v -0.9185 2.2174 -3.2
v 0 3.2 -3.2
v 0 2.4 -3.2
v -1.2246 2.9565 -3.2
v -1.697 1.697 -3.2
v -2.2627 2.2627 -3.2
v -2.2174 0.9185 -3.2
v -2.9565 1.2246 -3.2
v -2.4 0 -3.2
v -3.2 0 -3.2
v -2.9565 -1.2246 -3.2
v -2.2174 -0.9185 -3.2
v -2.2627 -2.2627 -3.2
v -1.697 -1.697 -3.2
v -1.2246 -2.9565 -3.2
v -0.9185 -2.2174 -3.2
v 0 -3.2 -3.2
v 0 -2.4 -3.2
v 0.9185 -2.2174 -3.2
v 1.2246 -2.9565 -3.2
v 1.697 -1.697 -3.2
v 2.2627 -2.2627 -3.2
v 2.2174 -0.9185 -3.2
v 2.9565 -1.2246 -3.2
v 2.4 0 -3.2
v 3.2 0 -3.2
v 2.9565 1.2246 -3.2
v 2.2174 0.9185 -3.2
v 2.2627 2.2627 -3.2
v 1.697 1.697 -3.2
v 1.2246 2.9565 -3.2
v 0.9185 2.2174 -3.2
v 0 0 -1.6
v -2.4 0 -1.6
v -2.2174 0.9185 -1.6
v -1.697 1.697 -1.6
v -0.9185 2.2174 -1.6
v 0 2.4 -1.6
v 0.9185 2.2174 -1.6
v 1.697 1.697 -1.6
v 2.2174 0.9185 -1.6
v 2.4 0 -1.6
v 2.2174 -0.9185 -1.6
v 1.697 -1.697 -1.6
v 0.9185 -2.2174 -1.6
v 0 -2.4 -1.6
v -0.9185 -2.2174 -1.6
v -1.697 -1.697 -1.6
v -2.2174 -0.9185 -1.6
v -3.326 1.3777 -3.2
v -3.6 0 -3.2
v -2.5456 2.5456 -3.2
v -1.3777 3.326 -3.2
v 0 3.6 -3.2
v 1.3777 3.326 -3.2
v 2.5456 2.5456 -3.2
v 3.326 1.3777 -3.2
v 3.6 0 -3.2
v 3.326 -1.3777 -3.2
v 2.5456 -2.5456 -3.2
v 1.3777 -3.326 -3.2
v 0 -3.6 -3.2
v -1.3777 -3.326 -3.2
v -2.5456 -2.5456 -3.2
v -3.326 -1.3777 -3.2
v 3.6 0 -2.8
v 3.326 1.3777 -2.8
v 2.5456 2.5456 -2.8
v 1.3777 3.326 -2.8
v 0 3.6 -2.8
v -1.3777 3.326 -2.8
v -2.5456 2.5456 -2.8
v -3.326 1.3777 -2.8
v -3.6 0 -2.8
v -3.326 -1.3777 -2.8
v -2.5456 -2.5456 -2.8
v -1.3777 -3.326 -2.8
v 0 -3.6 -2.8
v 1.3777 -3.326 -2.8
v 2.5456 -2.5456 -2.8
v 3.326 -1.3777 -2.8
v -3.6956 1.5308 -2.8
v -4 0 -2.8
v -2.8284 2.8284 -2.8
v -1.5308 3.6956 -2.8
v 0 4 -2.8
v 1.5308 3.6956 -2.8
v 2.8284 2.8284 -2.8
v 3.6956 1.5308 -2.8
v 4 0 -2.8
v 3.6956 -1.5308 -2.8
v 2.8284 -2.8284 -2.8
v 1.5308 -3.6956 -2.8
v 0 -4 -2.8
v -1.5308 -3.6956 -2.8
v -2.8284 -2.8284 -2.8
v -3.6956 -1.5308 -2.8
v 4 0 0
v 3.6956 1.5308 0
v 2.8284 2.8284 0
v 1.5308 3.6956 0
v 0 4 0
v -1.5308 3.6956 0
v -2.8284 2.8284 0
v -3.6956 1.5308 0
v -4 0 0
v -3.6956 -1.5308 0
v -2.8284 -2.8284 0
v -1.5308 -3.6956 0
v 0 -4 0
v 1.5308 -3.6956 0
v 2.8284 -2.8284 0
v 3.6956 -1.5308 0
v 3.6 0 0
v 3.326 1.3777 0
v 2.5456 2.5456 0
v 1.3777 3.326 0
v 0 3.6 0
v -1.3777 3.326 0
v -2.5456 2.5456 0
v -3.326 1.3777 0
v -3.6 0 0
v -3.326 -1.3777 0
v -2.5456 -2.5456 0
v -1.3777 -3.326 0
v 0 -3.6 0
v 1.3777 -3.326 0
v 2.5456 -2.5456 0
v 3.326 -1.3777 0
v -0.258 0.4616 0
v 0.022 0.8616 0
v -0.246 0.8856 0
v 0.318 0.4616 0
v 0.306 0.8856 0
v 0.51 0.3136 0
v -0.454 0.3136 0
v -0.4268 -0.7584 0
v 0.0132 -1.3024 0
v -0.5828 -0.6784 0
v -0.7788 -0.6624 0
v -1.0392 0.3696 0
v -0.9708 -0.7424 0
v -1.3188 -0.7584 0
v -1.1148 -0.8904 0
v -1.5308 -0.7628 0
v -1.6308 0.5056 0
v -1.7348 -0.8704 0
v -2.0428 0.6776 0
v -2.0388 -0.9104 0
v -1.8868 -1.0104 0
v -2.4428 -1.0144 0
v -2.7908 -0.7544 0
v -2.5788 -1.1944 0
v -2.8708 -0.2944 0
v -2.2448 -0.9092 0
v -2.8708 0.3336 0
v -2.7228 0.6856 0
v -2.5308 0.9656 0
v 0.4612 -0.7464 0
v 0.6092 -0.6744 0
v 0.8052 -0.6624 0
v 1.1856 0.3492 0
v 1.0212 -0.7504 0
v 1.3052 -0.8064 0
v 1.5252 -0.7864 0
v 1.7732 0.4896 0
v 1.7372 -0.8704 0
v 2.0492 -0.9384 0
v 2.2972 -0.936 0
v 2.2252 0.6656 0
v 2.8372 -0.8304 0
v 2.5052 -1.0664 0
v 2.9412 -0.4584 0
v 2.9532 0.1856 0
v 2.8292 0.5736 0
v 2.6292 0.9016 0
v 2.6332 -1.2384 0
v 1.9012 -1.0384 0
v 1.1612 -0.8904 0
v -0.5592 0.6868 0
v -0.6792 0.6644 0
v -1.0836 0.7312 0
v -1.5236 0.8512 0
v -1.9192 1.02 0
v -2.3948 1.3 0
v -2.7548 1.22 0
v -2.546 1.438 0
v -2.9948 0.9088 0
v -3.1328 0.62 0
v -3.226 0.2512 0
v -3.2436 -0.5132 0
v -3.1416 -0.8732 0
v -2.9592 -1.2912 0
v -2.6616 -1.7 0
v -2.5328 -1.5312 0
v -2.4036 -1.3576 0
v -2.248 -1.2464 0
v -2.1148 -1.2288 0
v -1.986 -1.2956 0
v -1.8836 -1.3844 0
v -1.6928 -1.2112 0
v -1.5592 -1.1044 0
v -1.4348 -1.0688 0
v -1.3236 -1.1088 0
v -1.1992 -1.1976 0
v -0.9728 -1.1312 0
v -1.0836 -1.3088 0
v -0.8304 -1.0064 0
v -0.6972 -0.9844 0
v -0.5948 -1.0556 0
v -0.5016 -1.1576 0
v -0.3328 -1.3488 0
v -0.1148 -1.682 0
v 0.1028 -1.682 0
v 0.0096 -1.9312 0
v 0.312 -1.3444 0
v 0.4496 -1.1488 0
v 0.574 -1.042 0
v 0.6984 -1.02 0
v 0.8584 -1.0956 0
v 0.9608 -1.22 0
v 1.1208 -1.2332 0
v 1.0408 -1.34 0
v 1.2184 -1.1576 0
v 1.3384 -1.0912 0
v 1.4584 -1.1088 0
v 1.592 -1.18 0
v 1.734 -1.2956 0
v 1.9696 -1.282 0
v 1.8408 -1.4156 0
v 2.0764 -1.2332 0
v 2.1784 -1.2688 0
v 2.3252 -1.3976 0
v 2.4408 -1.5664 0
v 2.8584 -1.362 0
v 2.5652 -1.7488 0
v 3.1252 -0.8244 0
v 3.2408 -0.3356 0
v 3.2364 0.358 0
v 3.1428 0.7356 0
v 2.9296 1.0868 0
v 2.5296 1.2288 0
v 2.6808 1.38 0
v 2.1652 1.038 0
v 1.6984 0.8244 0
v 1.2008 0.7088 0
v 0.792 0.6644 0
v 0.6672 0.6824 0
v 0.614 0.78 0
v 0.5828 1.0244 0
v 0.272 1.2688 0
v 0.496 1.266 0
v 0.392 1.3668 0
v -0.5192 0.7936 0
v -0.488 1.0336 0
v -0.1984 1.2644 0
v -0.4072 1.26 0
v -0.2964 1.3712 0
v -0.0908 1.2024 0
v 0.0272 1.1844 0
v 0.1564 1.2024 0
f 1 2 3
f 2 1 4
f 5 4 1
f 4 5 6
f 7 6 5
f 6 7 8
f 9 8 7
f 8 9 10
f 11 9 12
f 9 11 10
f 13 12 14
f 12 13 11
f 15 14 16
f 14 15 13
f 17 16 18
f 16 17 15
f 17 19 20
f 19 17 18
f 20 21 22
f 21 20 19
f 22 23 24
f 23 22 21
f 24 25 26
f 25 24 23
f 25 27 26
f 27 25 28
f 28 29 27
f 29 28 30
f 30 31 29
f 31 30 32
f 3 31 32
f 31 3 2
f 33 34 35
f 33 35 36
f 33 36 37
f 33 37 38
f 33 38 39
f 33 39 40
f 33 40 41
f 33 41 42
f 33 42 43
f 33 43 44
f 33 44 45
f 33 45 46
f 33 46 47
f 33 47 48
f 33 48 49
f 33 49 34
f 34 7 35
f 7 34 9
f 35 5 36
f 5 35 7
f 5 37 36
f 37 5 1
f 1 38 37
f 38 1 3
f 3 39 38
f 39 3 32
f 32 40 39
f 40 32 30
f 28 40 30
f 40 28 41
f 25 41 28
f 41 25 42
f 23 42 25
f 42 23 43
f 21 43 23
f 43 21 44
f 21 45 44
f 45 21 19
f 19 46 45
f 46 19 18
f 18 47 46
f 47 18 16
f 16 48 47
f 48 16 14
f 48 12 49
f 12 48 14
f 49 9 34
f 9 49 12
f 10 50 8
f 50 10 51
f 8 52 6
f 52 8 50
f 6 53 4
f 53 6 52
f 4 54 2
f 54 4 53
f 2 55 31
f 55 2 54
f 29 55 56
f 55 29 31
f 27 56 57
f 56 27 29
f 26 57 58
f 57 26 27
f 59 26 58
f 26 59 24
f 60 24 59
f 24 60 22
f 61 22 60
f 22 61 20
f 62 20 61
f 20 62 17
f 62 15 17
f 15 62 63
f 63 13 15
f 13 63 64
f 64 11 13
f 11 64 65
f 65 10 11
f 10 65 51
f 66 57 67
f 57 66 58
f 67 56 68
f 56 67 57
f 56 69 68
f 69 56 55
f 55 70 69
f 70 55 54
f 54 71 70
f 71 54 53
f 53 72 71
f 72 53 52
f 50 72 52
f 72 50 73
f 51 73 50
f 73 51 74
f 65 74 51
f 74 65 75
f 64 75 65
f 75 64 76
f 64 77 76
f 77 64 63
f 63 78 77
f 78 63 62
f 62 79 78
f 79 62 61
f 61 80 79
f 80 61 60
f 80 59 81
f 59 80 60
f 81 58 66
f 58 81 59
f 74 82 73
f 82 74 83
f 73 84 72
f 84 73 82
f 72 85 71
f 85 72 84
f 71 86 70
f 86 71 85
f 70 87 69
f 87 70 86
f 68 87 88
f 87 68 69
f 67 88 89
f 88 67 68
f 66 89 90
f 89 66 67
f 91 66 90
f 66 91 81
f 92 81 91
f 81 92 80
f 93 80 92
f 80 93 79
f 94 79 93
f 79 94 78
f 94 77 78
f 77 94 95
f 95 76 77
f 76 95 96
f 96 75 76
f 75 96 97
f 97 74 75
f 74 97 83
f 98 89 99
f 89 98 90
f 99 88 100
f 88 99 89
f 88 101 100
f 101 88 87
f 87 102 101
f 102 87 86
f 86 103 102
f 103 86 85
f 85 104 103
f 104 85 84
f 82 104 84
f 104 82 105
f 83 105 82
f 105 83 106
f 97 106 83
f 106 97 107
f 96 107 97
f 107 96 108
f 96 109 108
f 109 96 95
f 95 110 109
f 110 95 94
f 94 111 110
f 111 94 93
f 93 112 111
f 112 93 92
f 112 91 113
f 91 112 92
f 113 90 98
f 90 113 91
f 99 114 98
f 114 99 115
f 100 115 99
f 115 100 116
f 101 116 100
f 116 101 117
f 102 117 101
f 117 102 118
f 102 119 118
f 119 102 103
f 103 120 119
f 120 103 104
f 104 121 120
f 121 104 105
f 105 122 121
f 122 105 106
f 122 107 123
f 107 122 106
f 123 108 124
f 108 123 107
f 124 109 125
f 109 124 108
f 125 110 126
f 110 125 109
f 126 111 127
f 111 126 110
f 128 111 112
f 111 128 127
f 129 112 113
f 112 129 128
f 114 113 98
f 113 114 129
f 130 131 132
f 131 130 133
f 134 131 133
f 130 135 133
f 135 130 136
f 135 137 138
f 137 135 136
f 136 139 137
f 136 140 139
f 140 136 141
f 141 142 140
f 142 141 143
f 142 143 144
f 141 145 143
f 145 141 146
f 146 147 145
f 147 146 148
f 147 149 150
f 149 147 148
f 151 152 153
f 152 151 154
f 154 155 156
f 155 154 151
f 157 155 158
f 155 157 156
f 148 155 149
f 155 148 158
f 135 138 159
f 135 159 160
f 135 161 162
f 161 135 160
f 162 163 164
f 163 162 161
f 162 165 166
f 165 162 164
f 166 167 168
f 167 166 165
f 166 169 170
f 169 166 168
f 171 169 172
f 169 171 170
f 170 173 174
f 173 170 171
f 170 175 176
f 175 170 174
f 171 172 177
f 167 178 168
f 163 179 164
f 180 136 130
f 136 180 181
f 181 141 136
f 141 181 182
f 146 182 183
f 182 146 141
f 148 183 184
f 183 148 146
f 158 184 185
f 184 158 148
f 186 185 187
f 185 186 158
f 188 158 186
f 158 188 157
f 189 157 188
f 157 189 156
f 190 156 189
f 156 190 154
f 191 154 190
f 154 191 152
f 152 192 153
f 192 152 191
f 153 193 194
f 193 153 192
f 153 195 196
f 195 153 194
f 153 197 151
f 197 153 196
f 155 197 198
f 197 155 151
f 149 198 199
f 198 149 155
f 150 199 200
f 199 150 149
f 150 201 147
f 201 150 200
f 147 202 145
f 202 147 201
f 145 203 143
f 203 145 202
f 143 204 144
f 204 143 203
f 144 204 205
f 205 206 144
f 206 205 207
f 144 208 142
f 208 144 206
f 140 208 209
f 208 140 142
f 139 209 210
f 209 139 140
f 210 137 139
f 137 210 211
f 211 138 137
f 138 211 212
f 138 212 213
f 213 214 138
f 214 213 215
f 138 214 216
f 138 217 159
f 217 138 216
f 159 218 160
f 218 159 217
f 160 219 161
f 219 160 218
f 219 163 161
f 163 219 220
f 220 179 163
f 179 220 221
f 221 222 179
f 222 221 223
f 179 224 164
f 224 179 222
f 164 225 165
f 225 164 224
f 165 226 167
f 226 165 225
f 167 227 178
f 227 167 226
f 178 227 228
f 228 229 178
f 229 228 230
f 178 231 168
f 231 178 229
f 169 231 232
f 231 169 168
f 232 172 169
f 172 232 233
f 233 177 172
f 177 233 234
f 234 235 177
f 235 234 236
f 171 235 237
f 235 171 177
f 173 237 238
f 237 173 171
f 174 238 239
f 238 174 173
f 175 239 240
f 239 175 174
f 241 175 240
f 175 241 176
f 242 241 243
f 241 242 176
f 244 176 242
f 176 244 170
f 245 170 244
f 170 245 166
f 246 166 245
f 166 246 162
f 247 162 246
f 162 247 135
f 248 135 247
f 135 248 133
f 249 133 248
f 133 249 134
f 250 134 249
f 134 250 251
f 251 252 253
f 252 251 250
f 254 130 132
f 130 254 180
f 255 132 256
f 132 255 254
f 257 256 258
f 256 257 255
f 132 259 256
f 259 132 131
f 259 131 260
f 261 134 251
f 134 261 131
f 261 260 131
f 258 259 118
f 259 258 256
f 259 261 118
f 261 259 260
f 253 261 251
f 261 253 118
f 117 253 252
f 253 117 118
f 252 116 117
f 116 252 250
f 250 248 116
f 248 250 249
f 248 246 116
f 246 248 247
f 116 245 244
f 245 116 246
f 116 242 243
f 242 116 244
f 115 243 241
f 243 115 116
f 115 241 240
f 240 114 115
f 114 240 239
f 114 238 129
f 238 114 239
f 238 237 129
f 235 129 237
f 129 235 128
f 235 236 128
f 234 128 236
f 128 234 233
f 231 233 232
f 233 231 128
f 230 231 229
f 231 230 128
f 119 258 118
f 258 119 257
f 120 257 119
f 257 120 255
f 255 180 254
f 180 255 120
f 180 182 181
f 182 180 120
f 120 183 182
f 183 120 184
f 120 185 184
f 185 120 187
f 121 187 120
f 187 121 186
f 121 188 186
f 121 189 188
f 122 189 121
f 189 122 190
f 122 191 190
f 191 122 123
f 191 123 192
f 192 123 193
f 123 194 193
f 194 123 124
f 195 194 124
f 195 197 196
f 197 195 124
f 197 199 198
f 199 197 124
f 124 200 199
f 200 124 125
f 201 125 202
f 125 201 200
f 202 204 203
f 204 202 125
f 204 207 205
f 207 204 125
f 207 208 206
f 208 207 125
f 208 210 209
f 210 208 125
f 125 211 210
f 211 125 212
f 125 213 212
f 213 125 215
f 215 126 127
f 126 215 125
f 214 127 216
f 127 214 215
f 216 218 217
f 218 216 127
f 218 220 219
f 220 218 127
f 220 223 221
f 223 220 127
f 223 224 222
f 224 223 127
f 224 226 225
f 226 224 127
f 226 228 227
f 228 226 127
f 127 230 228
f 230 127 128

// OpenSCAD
use <../lib.scad>
use <../p/4-4ering.scad>
use <s/98138s01.scad>
$fa=1; $fs=0.2;
function ldraw_lib__98138pb1(realsolid=false) = [
// 0 Tile  1 x  1 Round with Red Bat Symbol Pattern
// 0 Name: 98138pb1.dat
// 0 Author: Heiko Jelnikar [KlotzKiste]
// 0 !LDRAW_ORG Part UPDATE 2016-01
// 0 !LICENSE Licensed under CC BY 2.0 and CC BY 4.0 : see CAreadme.txt
// 
// 0 BFC CERTIFY CCW
  [0,"BFC","CERTIFY"],
  [0,"BFC","CCW"],
// 
// 0 !HISTORY 2016-12-31 [PTadmin] Official Update 2016-01
// 
// 
// 1 16 0 0 0 1 0 0 0 1 0 0 0 1 s\98138s01.dat
  [1,16,0,0,0,1,0,0,0,1,0,0,0,1, ldraw_lib__s__98138s01(realsolid)],
// 1 16 0 0 0 9 0 0 0 1 0 0 0 9 4-4ering.dat
  [1,16,0,0,0,9,0,0,0,1,0,0,0,9, ldraw_lib__4_4ering(realsolid)],
// 
// 4 4 0.055 0 2.154 -0.615 0 2.214 -0.645 0 1.154 0.795 0 1.154
  [4,4,0.055,0,2.154,-0.615,0,2.214,-0.645,0,1.154,0.795,0,1.154],
// 3 4 0.765 0 2.214 0.055 0 2.154 0.795 0 1.154
  [3,4,0.765,0,2.214,0.055,0,2.154,0.795,0,1.154],
// 4 4 0.795 0 1.154 -0.645 0 1.154 -1.135 0 0.784 1.275 0 0.784
  [4,4,0.795,0,1.154,-0.645,0,1.154,-1.135,0,0.784,1.275,0,0.784],
// 4 4 -1.135 0 0.784 -1.067 0 -1.896 0.033 0 -3.256 1.275 0 0.784
  [4,4,-1.135,0,0.784,-1.067,0,-1.896,0.033,0,-3.256,1.275,0,0.784],
// 3 4 -1.135 0 0.784 -1.457 0 -1.696 -1.067 0 -1.896
  [3,4,-1.135,0,0.784,-1.457,0,-1.696,-1.067,0,-1.896],
// 4 4 -1.947 0 -1.656 -1.457 0 -1.696 -1.135 0 0.784 -2.598 0 0.924
  [4,4,-1.947,0,-1.656,-1.457,0,-1.696,-1.135,0,0.784,-2.598,0,0.924],
// 4 4 -2.427 0 -1.856 -1.947 0 -1.656 -2.598 0 0.924 -3.297 0 -1.896
  [4,4,-2.427,0,-1.856,-1.947,0,-1.656,-2.598,0,0.924,-3.297,0,-1.896],
// 3 4 -2.427 0 -1.856 -3.297 0 -1.896 -2.787 0 -2.226
  [3,4,-2.427,0,-1.856,-3.297,0,-1.896,-2.787,0,-2.226],
// 4 4 -3.297 0 -1.896 -2.598 0 0.924 -4.077 0 1.264 -3.827 0 -1.907
  [4,4,-3.297,0,-1.896,-2.598,0,0.924,-4.077,0,1.264,-3.827,0,-1.907],
// 4 4 -3.827 0 -1.907 -4.077 0 1.264 -5.107 0 1.694 -4.337 0 -2.176
  [4,4,-3.827,0,-1.907,-4.077,0,1.264,-5.107,0,1.694,-4.337,0,-2.176],
// 4 4 -4.337 0 -2.176 -5.107 0 1.694 -5.097 0 -2.276 -4.717 0 -2.526
  [4,4,-4.337,0,-2.176,-5.107,0,1.694,-5.097,0,-2.276,-4.717,0,-2.526],
// 4 4 -6.977 0 -1.886 -6.447 0 -2.986 -6.107 0 -2.536 -7.177 0 -0.736
  [4,4,-6.977,0,-1.886,-6.447,0,-2.986,-6.107,0,-2.536,-7.177,0,-0.736],
// 4 4 -7.177 0 -0.736 -6.107 0 -2.536 -5.612 0 -2.273 -7.177 0 0.834
  [4,4,-7.177,0,-0.736,-6.107,0,-2.536,-5.612,0,-2.273,-7.177,0,0.834],
// 4 4 -6.807 0 1.714 -7.177 0 0.834 -5.612 0 -2.273 -6.327 0 2.414
  [4,4,-6.807,0,1.714,-7.177,0,0.834,-5.612,0,-2.273,-6.327,0,2.414],
// 4 4 -6.327 0 2.414 -5.612 0 -2.273 -5.097 0 -2.276 -5.107 0 1.694
  [4,4,-6.327,0,2.414,-5.612,0,-2.273,-5.097,0,-2.276,-5.107,0,1.694],
// 3 4 1.275 0 0.784 0.033 0 -3.256 1.153 0 -1.866
  [3,4,1.275,0,0.784,0.033,0,-3.256,1.153,0,-1.866],
// 3 4 1.275 0 0.784 1.153 0 -1.866 1.523 0 -1.686
  [3,4,1.275,0,0.784,1.153,0,-1.866,1.523,0,-1.686],
// 4 4 1.275 0 0.784 1.523 0 -1.686 2.013 0 -1.656 2.964 0 0.873
  [4,4,1.275,0,0.784,1.523,0,-1.686,2.013,0,-1.656,2.964,0,0.873],
// 4 4 2.964 0 0.873 2.013 0 -1.656 2.553 0 -1.876 3.263 0 -2.016
  [4,4,2.964,0,0.873,2.013,0,-1.656,2.553,0,-1.876,3.263,0,-2.016],
// 4 4 2.964 0 0.873 3.263 0 -2.016 3.813 0 -1.966 4.433 0 1.224
  [4,4,2.964,0,0.873,3.263,0,-2.016,3.813,0,-1.966,4.433,0,1.224],
// 4 4 4.433 0 1.224 3.813 0 -1.966 4.343 0 -2.176 5.123 0 -2.346
  [4,4,4.433,0,1.224,3.813,0,-1.966,4.343,0,-2.176,5.123,0,-2.346],
// 4 4 4.433 0 1.224 5.123 0 -2.346 5.743 0 -2.34 5.563 0 1.664
  [4,4,4.433,0,1.224,5.123,0,-2.346,5.743,0,-2.34,5.563,0,1.664],
// 4 4 5.563 0 1.664 5.743 0 -2.34 6.263 0 -2.666 7.093 0 -2.076
  [4,4,5.563,0,1.664,5.743,0,-2.34,6.263,0,-2.666,7.093,0,-2.076],
// 4 4 5.563 0 1.664 7.093 0 -2.076 7.353 0 -1.146 7.383 0 0.464
  [4,4,5.563,0,1.664,7.093,0,-2.076,7.353,0,-1.146,7.383,0,0.464],
// 4 4 5.563 0 1.664 7.383 0 0.464 7.073 0 1.434 6.573 0 2.254
  [4,4,5.563,0,1.664,7.383,0,0.464,7.073,0,1.434,6.573,0,2.254],
// 3 4 7.093 0 -2.076 6.263 0 -2.666 6.583 0 -3.096
  [3,4,7.093,0,-2.076,6.263,0,-2.666,6.583,0,-3.096],
// 3 4 4.343 0 -2.176 4.753 0 -2.596 5.123 0 -2.346
  [3,4,4.343,0,-2.176,4.753,0,-2.596,5.123,0,-2.346],
// 3 4 2.553 0 -1.876 2.903 0 -2.226 3.263 0 -2.016
  [3,4,2.553,0,-1.876,2.903,0,-2.226,3.263,0,-2.016],
// 4 15 -1.135 0 0.784 -0.645 0 1.154 -1.398 0 1.717 -1.698 0 1.661
  [4,15,-1.135,0,0.784,-0.645,0,1.154,-1.398,0,1.717,-1.698,0,1.661],
// 4 15 -2.598 0 0.924 -1.135 0 0.784 -1.698 0 1.661 -2.709 0 1.828
  [4,15,-2.598,0,0.924,-1.135,0,0.784,-1.698,0,1.661,-2.709,0,1.828],
// 4 15 -4.077 0 1.264 -2.598 0 0.924 -2.709 0 1.828 -3.809 0 2.128
  [4,15,-4.077,0,1.264,-2.598,0,0.924,-2.709,0,1.828,-3.809,0,2.128],
// 4 15 -5.107 0 1.694 -4.077 0 1.264 -3.809 0 2.128 -4.798 0 2.55
  [4,15,-5.107,0,1.694,-4.077,0,1.264,-3.809,0,2.128,-4.798,0,2.55],
// 4 15 -6.327 0 2.414 -5.107 0 1.694 -4.798 0 2.55 -5.987 0 3.25
  [4,15,-6.327,0,2.414,-5.107,0,1.694,-4.798,0,2.55,-5.987,0,3.25],
// 4 15 -6.327 0 2.414 -5.987 0 3.25 -6.365 0 3.595 -6.887 0 3.05
  [4,15,-6.327,0,2.414,-5.987,0,3.25,-6.365,0,3.595,-6.887,0,3.05],
// 4 15 -6.327 0 2.414 -6.887 0 3.05 -7.487 0 2.272 -6.807 0 1.714
  [4,15,-6.327,0,2.414,-6.887,0,3.05,-7.487,0,2.272,-6.807,0,1.714],
// 4 15 -6.807 0 1.714 -7.487 0 2.272 -7.832 0 1.55 -7.177 0 0.834
  [4,15,-6.807,0,1.714,-7.487,0,2.272,-7.832,0,1.55,-7.177,0,0.834],
// 4 15 -7.177 0 0.834 -7.832 0 1.55 -8.065 0 0.628 -7.177 0 -0.736
  [4,15,-7.177,0,0.834,-7.832,0,1.55,-8.065,0,0.628,-7.177,0,-0.736],
// 4 15 -7.177 0 -0.736 -8.065 0 0.628 -8.109 0 -1.283 -6.977 0 -1.886
  [4,15,-7.177,0,-0.736,-8.065,0,0.628,-8.109,0,-1.283,-6.977,0,-1.886],
// 4 15 -6.977 0 -1.886 -8.109 0 -1.283 -7.854 0 -2.183 -6.447 0 -2.986
  [4,15,-6.977,0,-1.886,-8.109,0,-1.283,-7.854,0,-2.183,-6.447,0,-2.986],
// 4 15 -6.447 0 -2.986 -7.854 0 -2.183 -7.398 0 -3.228 -6.654 0 -4.25
  [4,15,-6.447,0,-2.986,-7.854,0,-2.183,-7.398,0,-3.228,-6.654,0,-4.25],
// 4 15 -6.447 0 -2.986 -6.654 0 -4.25 -6.332 0 -3.828 -6.009 0 -3.394
  [4,15,-6.447,0,-2.986,-6.654,0,-4.25,-6.332,0,-3.828,-6.009,0,-3.394],
// 4 15 -6.107 0 -2.536 -6.447 0 -2.986 -6.009 0 -3.394 -5.62 0 -3.116
  [4,15,-6.107,0,-2.536,-6.447,0,-2.986,-6.009,0,-3.394,-5.62,0,-3.116],
// 4 15 -5.612 0 -2.273 -6.107 0 -2.536 -5.62 0 -3.116 -5.287 0 -3.072
  [4,15,-5.612,0,-2.273,-6.107,0,-2.536,-5.62,0,-3.116,-5.287,0,-3.072],
// 4 15 -5.097 0 -2.276 -5.612 0 -2.273 -5.287 0 -3.072 -4.965 0 -3.239
  [4,15,-5.097,0,-2.276,-5.612,0,-2.273,-5.287,0,-3.072,-4.965,0,-3.239],
// 4 15 -4.717 0 -2.526 -5.097 0 -2.276 -4.965 0 -3.239 -4.709 0 -3.461
  [4,15,-4.717,0,-2.526,-5.097,0,-2.276,-4.965,0,-3.239,-4.709,0,-3.461],
// 4 15 -4.717 0 -2.526 -4.709 0 -3.461 -4.232 0 -3.028 -4.337 0 -2.176
  [4,15,-4.717,0,-2.526,-4.709,0,-3.461,-4.232,0,-3.028,-4.337,0,-2.176],
// 4 15 -4.337 0 -2.176 -4.232 0 -3.028 -3.898 0 -2.761 -3.827 0 -1.907
  [4,15,-4.337,0,-2.176,-4.232,0,-3.028,-3.898,0,-2.761,-3.827,0,-1.907],
// 4 15 -3.827 0 -1.907 -3.898 0 -2.761 -3.587 0 -2.672 -3.297 0 -1.896
  [4,15,-3.827,0,-1.907,-3.898,0,-2.761,-3.587,0,-2.672,-3.297,0,-1.896],
// 4 15 -3.297 0 -1.896 -3.587 0 -2.672 -3.309 0 -2.772 -2.787 0 -2.226
  [4,15,-3.297,0,-1.896,-3.587,0,-2.672,-3.309,0,-2.772,-2.787,0,-2.226],
// 3 15 -2.787 0 -2.226 -3.309 0 -2.772 -2.998 0 -2.994
  [3,15,-2.787,0,-2.226,-3.309,0,-2.772,-2.998,0,-2.994],
// 4 15 -2.787 0 -2.226 -2.998 0 -2.994 -2.709 0 -3.272 -2.432 0 -2.828
  [4,15,-2.787,0,-2.226,-2.998,0,-2.994,-2.709,0,-3.272,-2.432,0,-2.828],
// 4 15 -2.427 0 -1.856 -2.787 0 -2.226 -2.432 0 -2.828 -2.076 0 -2.516
  [4,15,-2.427,0,-1.856,-2.787,0,-2.226,-2.432,0,-2.828,-2.076,0,-2.516],
// 4 15 -1.947 0 -1.656 -2.427 0 -1.856 -2.076 0 -2.516 -1.743 0 -2.461
  [4,15,-1.947,0,-1.656,-2.427,0,-1.856,-2.076,0,-2.516,-1.743,0,-2.461],
// 4 15 -1.457 0 -1.696 -1.947 0 -1.656 -1.743 0 -2.461 -1.487 0 -2.639
  [4,15,-1.457,0,-1.696,-1.947,0,-1.656,-1.743,0,-2.461,-1.487,0,-2.639],
// 4 15 -1.067 0 -1.896 -1.457 0 -1.696 -1.487 0 -2.639 -1.254 0 -2.894
  [4,15,-1.067,0,-1.896,-1.457,0,-1.696,-1.487,0,-2.639,-1.254,0,-2.894],
// 4 15 0.033 0 -3.256 -1.067 0 -1.896 -1.254 0 -2.894 -0.832 0 -3.372
  [4,15,0.033,0,-3.256,-1.067,0,-1.896,-1.254,0,-2.894,-0.832,0,-3.372],
// 3 15 0.033 0 -3.256 -0.832 0 -3.372 -0.287 0 -4.205
  [3,15,0.033,0,-3.256,-0.832,0,-3.372,-0.287,0,-4.205],
// 4 15 0.033 0 -3.256 -0.287 0 -4.205 0.024 0 -4.828 0.257 0 -4.205
  [4,15,0.033,0,-3.256,-0.287,0,-4.205,0.024,0,-4.828,0.257,0,-4.205],
// 3 15 0.033 0 -3.256 0.257 0 -4.205 0.78 0 -3.361
  [3,15,0.033,0,-3.256,0.257,0,-4.205,0.78,0,-3.361],
// 4 15 0.033 0 -3.256 0.78 0 -3.361 1.124 0 -2.872 1.153 0 -1.866
  [4,15,0.033,0,-3.256,0.78,0,-3.361,1.124,0,-2.872,1.153,0,-1.866],
// 4 15 1.153 0 -1.866 1.124 0 -2.872 1.435 0 -2.605 1.523 0 -1.686
  [4,15,1.153,0,-1.866,1.124,0,-2.872,1.435,0,-2.605,1.523,0,-1.686],
// 4 15 1.523 0 -1.686 1.435 0 -2.605 1.746 0 -2.55 2.013 0 -1.656
  [4,15,1.523,0,-1.686,1.435,0,-2.605,1.746,0,-2.55,2.013,0,-1.656],
// 4 15 2.013 0 -1.656 1.746 0 -2.55 2.146 0 -2.739 2.553 0 -1.876
  [4,15,2.013,0,-1.656,1.746,0,-2.55,2.146,0,-2.739,2.553,0,-1.876],
// 4 15 2.553 0 -1.876 2.146 0 -2.739 2.402 0 -3.05 2.903 0 -2.226
  [4,15,2.553,0,-1.876,2.146,0,-2.739,2.402,0,-3.05,2.903,0,-2.226],
// 4 15 2.903 0 -2.226 2.402 0 -3.05 2.602 0 -3.35 2.802 0 -3.083
  [4,15,2.903,0,-2.226,2.402,0,-3.05,2.602,0,-3.35,2.802,0,-3.083],
// 4 15 2.903 0 -2.226 2.802 0 -3.083 3.046 0 -2.894 3.263 0 -2.016
  [4,15,2.903,0,-2.226,2.802,0,-3.083,3.046,0,-2.894,3.263,0,-2.016],
// 4 15 3.263 0 -2.016 3.046 0 -2.894 3.346 0 -2.728 3.813 0 -1.966
  [4,15,3.263,0,-2.016,3.046,0,-2.894,3.346,0,-2.728,3.813,0,-1.966],
// 4 15 3.813 0 -1.966 3.346 0 -2.728 3.646 0 -2.772 4.343 0 -2.176
  [4,15,3.813,0,-1.966,3.346,0,-2.728,3.646,0,-2.772,4.343,0,-2.176],
// 4 15 4.343 0 -2.176 3.646 0 -2.772 3.98 0 -2.95 4.753 0 -2.596
  [4,15,4.343,0,-2.176,3.646,0,-2.772,3.98,0,-2.95,4.753,0,-2.596],
// 3 15 4.753 0 -2.596 3.98 0 -2.95 4.335 0 -3.239
  [3,15,4.753,0,-2.596,3.98,0,-2.95,4.335,0,-3.239],
// 4 15 4.753 0 -2.596 4.335 0 -3.239 4.602 0 -3.539 4.924 0 -3.205
  [4,15,4.753,0,-2.596,4.335,0,-3.239,4.602,0,-3.539,4.924,0,-3.205],
// 4 15 4.753 0 -2.596 4.924 0 -3.205 5.191 0 -3.083 5.123 0 -2.346
  [4,15,4.753,0,-2.596,4.924,0,-3.205,5.191,0,-3.083,5.123,0,-2.346],
// 4 15 5.123 0 -2.346 5.191 0 -3.083 5.446 0 -3.172 5.743 0 -2.34
  [4,15,5.123,0,-2.346,5.191,0,-3.083,5.446,0,-3.172,5.743,0,-2.34],
// 4 15 5.743 0 -2.34 5.446 0 -3.172 5.813 0 -3.494 6.263 0 -2.666
  [4,15,5.743,0,-2.34,5.446,0,-3.172,5.813,0,-3.494,6.263,0,-2.666],
// 4 15 6.263 0 -2.666 5.813 0 -3.494 6.102 0 -3.916 6.583 0 -3.096
  [4,15,6.263,0,-2.666,5.813,0,-3.494,6.102,0,-3.916,6.583,0,-3.096],
// 4 15 6.583 0 -3.096 6.102 0 -3.916 6.413 0 -4.372 7.146 0 -3.405
  [4,15,6.583,0,-3.096,6.102,0,-3.916,6.413,0,-4.372,7.146,0,-3.405],
// 4 15 7.093 0 -2.076 6.583 0 -3.096 7.146 0 -3.405 7.813 0 -2.061
  [4,15,7.093,0,-2.076,6.583,0,-3.096,7.146,0,-3.405,7.813,0,-2.061],
// 4 15 7.353 0 -1.146 7.093 0 -2.076 7.813 0 -2.061 8.102 0 -0.839
  [4,15,7.353,0,-1.146,7.093,0,-2.076,7.813,0,-2.061,8.102,0,-0.839],
// 4 15 7.383 0 0.464 7.353 0 -1.146 8.102 0 -0.839 8.091 0 0.895
  [4,15,7.383,0,0.464,7.353,0,-1.146,8.102,0,-0.839,8.091,0,0.895],
// 4 15 7.073 0 1.434 7.383 0 0.464 8.091 0 0.895 7.857 0 1.839
  [4,15,7.073,0,1.434,7.383,0,0.464,8.091,0,0.895,7.857,0,1.839],
// 4 15 6.573 0 2.254 7.073 0 1.434 7.857 0 1.839 7.324 0 2.717
  [4,15,6.573,0,2.254,7.073,0,1.434,7.857,0,1.839,7.324,0,2.717],
// 4 15 6.573 0 2.254 7.324 0 2.717 6.702 0 3.45 6.324 0 3.072
  [4,15,6.573,0,2.254,7.324,0,2.717,6.702,0,3.45,6.324,0,3.072],
// 4 15 5.563 0 1.664 6.573 0 2.254 6.324 0 3.072 5.413 0 2.595
  [4,15,5.563,0,1.664,6.573,0,2.254,6.324,0,3.072,5.413,0,2.595],
// 4 15 4.433 0 1.224 5.563 0 1.664 5.413 0 2.595 4.246 0 2.061
  [4,15,4.433,0,1.224,5.563,0,1.664,5.413,0,2.595,4.246,0,2.061],
// 4 15 2.964 0 0.873 4.433 0 1.224 4.246 0 2.061 3.002 0 1.772
  [4,15,2.964,0,0.873,4.433,0,1.224,4.246,0,2.061,3.002,0,1.772],
// 4 15 2.964 0 0.873 3.002 0 1.772 1.98 0 1.661 1.275 0 0.784
  [4,15,2.964,0,0.873,3.002,0,1.772,1.98,0,1.661,1.275,0,0.784],
// 4 15 1.275 0 0.784 1.98 0 1.661 1.668 0 1.706 0.795 0 1.154
  [4,15,1.275,0,0.784,1.98,0,1.661,1.668,0,1.706,0.795,0,1.154],
// 4 15 0.795 0 1.154 1.668 0 1.706 1.535 0 1.95 0.765 0 2.214
  [4,15,0.795,0,1.154,1.668,0,1.706,1.535,0,1.95,0.765,0,2.214],
// 4 15 0.765 0 2.214 1.535 0 1.95 1.457 0 2.561 0.68 0 3.172
  [4,15,0.765,0,2.214,1.535,0,1.95,1.457,0,2.561,0.68,0,3.172],
// 4 15 0.68 0 3.172 1.457 0 2.561 1.24 0 3.165 0.98 0 3.417
  [4,15,0.68,0,3.172,1.457,0,2.561,1.24,0,3.165,0.98,0,3.417],
// 4 15 -1.298 0 1.984 -1.398 0 1.717 -0.645 0 1.154 -0.615 0 2.214
  [4,15,-1.298,0,1.984,-1.398,0,1.717,-0.645,0,1.154,-0.615,0,2.214],
// 4 15 -1.22 0 2.584 -1.298 0 1.984 -0.615 0 2.214 -0.496 0 3.161
  [4,15,-1.22,0,2.584,-1.298,0,1.984,-0.615,0,2.214,-0.496,0,3.161],
// 4 15 -1.018 0 3.15 -1.22 0 2.584 -0.496 0 3.161 -0.741 0 3.428
  [4,15,-1.018,0,3.15,-1.22,0,2.584,-0.496,0,3.161,-0.741,0,3.428],
// 4 15 -0.227 0 3.006 -0.496 0 3.161 -0.615 0 2.214 0.055 0 2.154
  [4,15,-0.227,0,3.006,-0.496,0,3.161,-0.615,0,2.214,0.055,0,2.154],
// 3 15 -0.227 0 3.006 0.055 0 2.154 0.068 0 2.961
  [3,15,-0.227,0,3.006,0.055,0,2.154,0.068,0,2.961],
// 4 15 0.765 0 2.214 0.68 0 3.172 0.391 0 3.006 0.055 0 2.154
  [4,15,0.765,0,2.214,0.68,0,3.172,0.391,0,3.006,0.055,0,2.154],
// 3 15 0.391 0 3.006 0.068 0 2.961 0.055 0 2.154
  [3,15,0.391,0,3.006,0.068,0,2.961,0.055,0,2.154],
// 4 16 0 0 9 -0.741 0 3.428 -0.496 0 3.161 -0.227 0 3.006
  [4,16,0,0,9,-0.741,0,3.428,-0.496,0,3.161,-0.227,0,3.006],
// 4 16 0 0 9 -0.227 0 3.006 0.068 0 2.961 0.391 0 3.006
  [4,16,0,0,9,-0.227,0,3.006,0.068,0,2.961,0.391,0,3.006],
// 4 16 0 0 9 0.391 0 3.006 0.68 0 3.172 0.98 0 3.417
  [4,16,0,0,9,0.391,0,3.006,0.68,0,3.172,0.98,0,3.417],
// 4 16 3.4443 0 8.3151 0 0 9 0.98 0 3.417 1.24 0 3.165
  [4,16,3.4443,0,8.3151,0,0,9,0.98,0,3.417,1.24,0,3.165],
// 4 16 6.3639 0 6.3639 3.4443 0 8.3151 1.24 0 3.165 1.457 0 2.561
  [4,16,6.3639,0,6.3639,3.4443,0,8.3151,1.24,0,3.165,1.457,0,2.561],
// 4 16 6.3639 0 6.3639 1.457 0 2.561 1.535 0 1.95 1.668 0 1.706
  [4,16,6.3639,0,6.3639,1.457,0,2.561,1.535,0,1.95,1.668,0,1.706],
// 4 16 6.3639 0 6.3639 1.668 0 1.706 1.98 0 1.661 3.002 0 1.772
  [4,16,6.3639,0,6.3639,1.668,0,1.706,1.98,0,1.661,3.002,0,1.772],
// 4 16 6.3639 0 6.3639 3.002 0 1.772 4.246 0 2.061 5.413 0 2.595
  [4,16,6.3639,0,6.3639,3.002,0,1.772,4.246,0,2.061,5.413,0,2.595],
// 4 16 6.3639 0 6.3639 5.413 0 2.595 6.324 0 3.072 6.702 0 3.45
  [4,16,6.3639,0,6.3639,5.413,0,2.595,6.324,0,3.072,6.702,0,3.45],
// 4 16 8.3151 0 3.4443 6.3639 0 6.3639 6.702 0 3.45 7.324 0 2.717
  [4,16,8.3151,0,3.4443,6.3639,0,6.3639,6.702,0,3.45,7.324,0,2.717],
// 3 16 8.3151 0 3.4443 7.324 0 2.717 7.857 0 1.839
  [3,16,8.3151,0,3.4443,7.324,0,2.717,7.857,0,1.839],
// 4 16 8.3151 0 3.4443 7.857 0 1.839 8.091 0 0.895 9 0 0
  [4,16,8.3151,0,3.4443,7.857,0,1.839,8.091,0,0.895,9,0,0],
// 4 16 9 0 0 8.091 0 0.895 8.102 0 -0.839 8.3151 0 -3.4443
  [4,16,9,0,0,8.091,0,0.895,8.102,0,-0.839,8.3151,0,-3.4443],
// 3 16 8.102 0 -0.839 7.813 0 -2.061 8.3151 0 -3.4443
  [3,16,8.102,0,-0.839,7.813,0,-2.061,8.3151,0,-3.4443],
// 4 16 8.3151 0 -3.4443 7.813 0 -2.061 7.146 0 -3.405 6.3639 0 -6.3639
  [4,16,8.3151,0,-3.4443,7.813,0,-2.061,7.146,0,-3.405,6.3639,0,-6.3639],
// 3 16 7.146 0 -3.405 6.413 0 -4.372 6.3639 0 -6.3639
  [3,16,7.146,0,-3.405,6.413,0,-4.372,6.3639,0,-6.3639],
// 4 16 6.3639 0 -6.3639 6.413 0 -4.372 6.102 0 -3.916 5.813 0 -3.494
  [4,16,6.3639,0,-6.3639,6.413,0,-4.372,6.102,0,-3.916,5.813,0,-3.494],
// 4 16 6.3639 0 -6.3639 5.813 0 -3.494 5.446 0 -3.172 5.191 0 -3.083
  [4,16,6.3639,0,-6.3639,5.813,0,-3.494,5.446,0,-3.172,5.191,0,-3.083],
// 4 16 6.3639 0 -6.3639 5.191 0 -3.083 4.924 0 -3.205 4.602 0 -3.539
  [4,16,6.3639,0,-6.3639,5.191,0,-3.083,4.924,0,-3.205,4.602,0,-3.539],
// 4 16 -0.741 0 3.428 0 0 9 -3.4443 0 8.3151 -1.018 0 3.15
  [4,16,-0.741,0,3.428,0,0,9,-3.4443,0,8.3151,-1.018,0,3.15],
// 4 16 -1.018 0 3.15 -3.4443 0 8.3151 -6.3639 0 6.3639 -1.22 0 2.584
  [4,16,-1.018,0,3.15,-3.4443,0,8.3151,-6.3639,0,6.3639,-1.22,0,2.584],
// 4 16 -1.298 0 1.984 -1.22 0 2.584 -6.3639 0 6.3639 -1.398 0 1.717
  [4,16,-1.298,0,1.984,-1.22,0,2.584,-6.3639,0,6.3639,-1.398,0,1.717],
// 4 16 -1.698 0 1.661 -1.398 0 1.717 -6.3639 0 6.3639 -2.709 0 1.828
  [4,16,-1.698,0,1.661,-1.398,0,1.717,-6.3639,0,6.3639,-2.709,0,1.828],
// 4 16 -3.809 0 2.128 -2.709 0 1.828 -6.3639 0 6.3639 -4.798 0 2.55
  [4,16,-3.809,0,2.128,-2.709,0,1.828,-6.3639,0,6.3639,-4.798,0,2.55],
// 4 16 -5.987 0 3.25 -4.798 0 2.55 -6.3639 0 6.3639 -6.365 0 3.595
  [4,16,-5.987,0,3.25,-4.798,0,2.55,-6.3639,0,6.3639,-6.365,0,3.595],
// 4 16 -6.365 0 3.595 -6.3639 0 6.3639 -8.3151 0 3.4443 -6.887 0 3.05
  [4,16,-6.365,0,3.595,-6.3639,0,6.3639,-8.3151,0,3.4443,-6.887,0,3.05],
// 3 16 -8.3151 0 3.4443 -7.487 0 2.272 -6.887 0 3.05
  [3,16,-8.3151,0,3.4443,-7.487,0,2.272,-6.887,0,3.05],
// 3 16 -8.3151 0 3.4443 -7.832 0 1.55 -7.487 0 2.272
  [3,16,-8.3151,0,3.4443,-7.832,0,1.55,-7.487,0,2.272],
// 4 16 -8.065 0 0.628 -7.832 0 1.55 -8.3151 0 3.4443 -9 0 0
  [4,16,-8.065,0,0.628,-7.832,0,1.55,-8.3151,0,3.4443,-9,0,0],
// 4 16 -8.109 0 -1.283 -8.065 0 0.628 -9 0 0 -8.3151 0 -3.4443
  [4,16,-8.109,0,-1.283,-8.065,0,0.628,-9,0,0,-8.3151,0,-3.4443],
// 3 16 -8.109 0 -1.283 -8.3151 0 -3.4443 -7.854 0 -2.183
  [3,16,-8.109,0,-1.283,-8.3151,0,-3.4443,-7.854,0,-2.183],
// 3 16 -7.854 0 -2.183 -8.3151 0 -3.4443 -7.398 0 -3.228
  [3,16,-7.854,0,-2.183,-8.3151,0,-3.4443,-7.398,0,-3.228],
// 4 16 -6.654 0 -4.25 -7.398 0 -3.228 -8.3151 0 -3.4443 -6.3639 0 -6.3639
  [4,16,-6.654,0,-4.25,-7.398,0,-3.228,-8.3151,0,-3.4443,-6.3639,0,-6.3639],
// 3 16 -6.332 0 -3.828 -6.654 0 -4.25 -6.3639 0 -6.3639
  [3,16,-6.332,0,-3.828,-6.654,0,-4.25,-6.3639,0,-6.3639],
// 4 16 -6.009 0 -3.394 -6.332 0 -3.828 -6.3639 0 -6.3639 -5.62 0 -3.116
  [4,16,-6.009,0,-3.394,-6.332,0,-3.828,-6.3639,0,-6.3639,-5.62,0,-3.116],
// 4 16 -5.287 0 -3.072 -5.62 0 -3.116 -6.3639 0 -6.3639 -4.965 0 -3.239
  [4,16,-5.287,0,-3.072,-5.62,0,-3.116,-6.3639,0,-6.3639,-4.965,0,-3.239],
// 4 16 -4.709 0 -3.461 -4.965 0 -3.239 -6.3639 0 -6.3639 -3.4443 0 -8.3151
  [4,16,-4.709,0,-3.461,-4.965,0,-3.239,-6.3639,0,-6.3639,-3.4443,0,-8.3151],
// 4 16 -4.232 0 -3.028 -4.709 0 -3.461 -3.4443 0 -8.3151 -3.898 0 -2.761
  [4,16,-4.232,0,-3.028,-4.709,0,-3.461,-3.4443,0,-8.3151,-3.898,0,-2.761],
// 4 16 -3.587 0 -2.672 -3.898 0 -2.761 -3.4443 0 -8.3151 -3.309 0 -2.772
  [4,16,-3.587,0,-2.672,-3.898,0,-2.761,-3.4443,0,-8.3151,-3.309,0,-2.772],
// 4 16 -2.998 0 -2.994 -3.309 0 -2.772 -3.4443 0 -8.3151 -2.709 0 -3.272
  [4,16,-2.998,0,-2.994,-3.309,0,-2.772,-3.4443,0,-8.3151,-2.709,0,-3.272],
// 4 16 -2.432 0 -2.828 -2.709 0 -3.272 -3.4443 0 -8.3151 -2.076 0 -2.516
  [4,16,-2.432,0,-2.828,-2.709,0,-3.272,-3.4443,0,-8.3151,-2.076,0,-2.516],
// 4 16 -1.743 0 -2.461 -2.076 0 -2.516 -3.4443 0 -8.3151 -1.487 0 -2.639
  [4,16,-1.743,0,-2.461,-2.076,0,-2.516,-3.4443,0,-8.3151,-1.487,0,-2.639],
// 4 16 -1.254 0 -2.894 -1.487 0 -2.639 -3.4443 0 -8.3151 -0.832 0 -3.372
  [4,16,-1.254,0,-2.894,-1.487,0,-2.639,-3.4443,0,-8.3151,-0.832,0,-3.372],
// 4 16 -0.287 0 -4.205 -0.832 0 -3.372 -3.4443 0 -8.3151 0.024 0 -4.828
  [4,16,-0.287,0,-4.205,-0.832,0,-3.372,-3.4443,0,-8.3151,0.024,0,-4.828],
// 4 16 0.024 0 -4.828 -3.4443 0 -8.3151 0 0 -9 3.4443 0 -8.3151
  [4,16,0.024,0,-4.828,-3.4443,0,-8.3151,0,0,-9,3.4443,0,-8.3151],
// 4 16 0.257 0 -4.205 0.024 0 -4.828 3.4443 0 -8.3151 0.78 0 -3.361
  [4,16,0.257,0,-4.205,0.024,0,-4.828,3.4443,0,-8.3151,0.78,0,-3.361],
// 4 16 1.124 0 -2.872 0.78 0 -3.361 3.4443 0 -8.3151 1.435 0 -2.605
  [4,16,1.124,0,-2.872,0.78,0,-3.361,3.4443,0,-8.3151,1.435,0,-2.605],
// 4 16 1.746 0 -2.55 1.435 0 -2.605 3.4443 0 -8.3151 2.146 0 -2.739
  [4,16,1.746,0,-2.55,1.435,0,-2.605,3.4443,0,-8.3151,2.146,0,-2.739],
// 4 16 2.402 0 -3.05 2.146 0 -2.739 3.4443 0 -8.3151 2.602 0 -3.35
  [4,16,2.402,0,-3.05,2.146,0,-2.739,3.4443,0,-8.3151,2.602,0,-3.35],
// 4 16 2.802 0 -3.083 2.602 0 -3.35 3.4443 0 -8.3151 3.046 0 -2.894
  [4,16,2.802,0,-3.083,2.602,0,-3.35,3.4443,0,-8.3151,3.046,0,-2.894],
// 4 16 3.346 0 -2.728 3.046 0 -2.894 3.4443 0 -8.3151 3.646 0 -2.772
  [4,16,3.346,0,-2.728,3.046,0,-2.894,3.4443,0,-8.3151,3.646,0,-2.772],
// 4 16 3.98 0 -2.95 3.646 0 -2.772 3.4443 0 -8.3151 4.335 0 -3.239
  [4,16,3.98,0,-2.95,3.646,0,-2.772,3.4443,0,-8.3151,4.335,0,-3.239],
// 4 16 4.602 0 -3.539 4.335 0 -3.239 3.4443 0 -8.3151 6.3639 0 -6.3639
  [4,16,4.602,0,-3.539,4.335,0,-3.239,3.4443,0,-8.3151,6.3639,0,-6.3639],
];
module ldraw_lib__98138pb1(step=0, col=false, unit=2/5, alt=false, line=0.2, solid=!$preview)
    makepoly(ldraw_lib__98138pb1(solid), step=step, col=col, unit=unit, alt=alt, line=line, solid=solid);
ldraw_lib__98138pb1(line=0.2);
